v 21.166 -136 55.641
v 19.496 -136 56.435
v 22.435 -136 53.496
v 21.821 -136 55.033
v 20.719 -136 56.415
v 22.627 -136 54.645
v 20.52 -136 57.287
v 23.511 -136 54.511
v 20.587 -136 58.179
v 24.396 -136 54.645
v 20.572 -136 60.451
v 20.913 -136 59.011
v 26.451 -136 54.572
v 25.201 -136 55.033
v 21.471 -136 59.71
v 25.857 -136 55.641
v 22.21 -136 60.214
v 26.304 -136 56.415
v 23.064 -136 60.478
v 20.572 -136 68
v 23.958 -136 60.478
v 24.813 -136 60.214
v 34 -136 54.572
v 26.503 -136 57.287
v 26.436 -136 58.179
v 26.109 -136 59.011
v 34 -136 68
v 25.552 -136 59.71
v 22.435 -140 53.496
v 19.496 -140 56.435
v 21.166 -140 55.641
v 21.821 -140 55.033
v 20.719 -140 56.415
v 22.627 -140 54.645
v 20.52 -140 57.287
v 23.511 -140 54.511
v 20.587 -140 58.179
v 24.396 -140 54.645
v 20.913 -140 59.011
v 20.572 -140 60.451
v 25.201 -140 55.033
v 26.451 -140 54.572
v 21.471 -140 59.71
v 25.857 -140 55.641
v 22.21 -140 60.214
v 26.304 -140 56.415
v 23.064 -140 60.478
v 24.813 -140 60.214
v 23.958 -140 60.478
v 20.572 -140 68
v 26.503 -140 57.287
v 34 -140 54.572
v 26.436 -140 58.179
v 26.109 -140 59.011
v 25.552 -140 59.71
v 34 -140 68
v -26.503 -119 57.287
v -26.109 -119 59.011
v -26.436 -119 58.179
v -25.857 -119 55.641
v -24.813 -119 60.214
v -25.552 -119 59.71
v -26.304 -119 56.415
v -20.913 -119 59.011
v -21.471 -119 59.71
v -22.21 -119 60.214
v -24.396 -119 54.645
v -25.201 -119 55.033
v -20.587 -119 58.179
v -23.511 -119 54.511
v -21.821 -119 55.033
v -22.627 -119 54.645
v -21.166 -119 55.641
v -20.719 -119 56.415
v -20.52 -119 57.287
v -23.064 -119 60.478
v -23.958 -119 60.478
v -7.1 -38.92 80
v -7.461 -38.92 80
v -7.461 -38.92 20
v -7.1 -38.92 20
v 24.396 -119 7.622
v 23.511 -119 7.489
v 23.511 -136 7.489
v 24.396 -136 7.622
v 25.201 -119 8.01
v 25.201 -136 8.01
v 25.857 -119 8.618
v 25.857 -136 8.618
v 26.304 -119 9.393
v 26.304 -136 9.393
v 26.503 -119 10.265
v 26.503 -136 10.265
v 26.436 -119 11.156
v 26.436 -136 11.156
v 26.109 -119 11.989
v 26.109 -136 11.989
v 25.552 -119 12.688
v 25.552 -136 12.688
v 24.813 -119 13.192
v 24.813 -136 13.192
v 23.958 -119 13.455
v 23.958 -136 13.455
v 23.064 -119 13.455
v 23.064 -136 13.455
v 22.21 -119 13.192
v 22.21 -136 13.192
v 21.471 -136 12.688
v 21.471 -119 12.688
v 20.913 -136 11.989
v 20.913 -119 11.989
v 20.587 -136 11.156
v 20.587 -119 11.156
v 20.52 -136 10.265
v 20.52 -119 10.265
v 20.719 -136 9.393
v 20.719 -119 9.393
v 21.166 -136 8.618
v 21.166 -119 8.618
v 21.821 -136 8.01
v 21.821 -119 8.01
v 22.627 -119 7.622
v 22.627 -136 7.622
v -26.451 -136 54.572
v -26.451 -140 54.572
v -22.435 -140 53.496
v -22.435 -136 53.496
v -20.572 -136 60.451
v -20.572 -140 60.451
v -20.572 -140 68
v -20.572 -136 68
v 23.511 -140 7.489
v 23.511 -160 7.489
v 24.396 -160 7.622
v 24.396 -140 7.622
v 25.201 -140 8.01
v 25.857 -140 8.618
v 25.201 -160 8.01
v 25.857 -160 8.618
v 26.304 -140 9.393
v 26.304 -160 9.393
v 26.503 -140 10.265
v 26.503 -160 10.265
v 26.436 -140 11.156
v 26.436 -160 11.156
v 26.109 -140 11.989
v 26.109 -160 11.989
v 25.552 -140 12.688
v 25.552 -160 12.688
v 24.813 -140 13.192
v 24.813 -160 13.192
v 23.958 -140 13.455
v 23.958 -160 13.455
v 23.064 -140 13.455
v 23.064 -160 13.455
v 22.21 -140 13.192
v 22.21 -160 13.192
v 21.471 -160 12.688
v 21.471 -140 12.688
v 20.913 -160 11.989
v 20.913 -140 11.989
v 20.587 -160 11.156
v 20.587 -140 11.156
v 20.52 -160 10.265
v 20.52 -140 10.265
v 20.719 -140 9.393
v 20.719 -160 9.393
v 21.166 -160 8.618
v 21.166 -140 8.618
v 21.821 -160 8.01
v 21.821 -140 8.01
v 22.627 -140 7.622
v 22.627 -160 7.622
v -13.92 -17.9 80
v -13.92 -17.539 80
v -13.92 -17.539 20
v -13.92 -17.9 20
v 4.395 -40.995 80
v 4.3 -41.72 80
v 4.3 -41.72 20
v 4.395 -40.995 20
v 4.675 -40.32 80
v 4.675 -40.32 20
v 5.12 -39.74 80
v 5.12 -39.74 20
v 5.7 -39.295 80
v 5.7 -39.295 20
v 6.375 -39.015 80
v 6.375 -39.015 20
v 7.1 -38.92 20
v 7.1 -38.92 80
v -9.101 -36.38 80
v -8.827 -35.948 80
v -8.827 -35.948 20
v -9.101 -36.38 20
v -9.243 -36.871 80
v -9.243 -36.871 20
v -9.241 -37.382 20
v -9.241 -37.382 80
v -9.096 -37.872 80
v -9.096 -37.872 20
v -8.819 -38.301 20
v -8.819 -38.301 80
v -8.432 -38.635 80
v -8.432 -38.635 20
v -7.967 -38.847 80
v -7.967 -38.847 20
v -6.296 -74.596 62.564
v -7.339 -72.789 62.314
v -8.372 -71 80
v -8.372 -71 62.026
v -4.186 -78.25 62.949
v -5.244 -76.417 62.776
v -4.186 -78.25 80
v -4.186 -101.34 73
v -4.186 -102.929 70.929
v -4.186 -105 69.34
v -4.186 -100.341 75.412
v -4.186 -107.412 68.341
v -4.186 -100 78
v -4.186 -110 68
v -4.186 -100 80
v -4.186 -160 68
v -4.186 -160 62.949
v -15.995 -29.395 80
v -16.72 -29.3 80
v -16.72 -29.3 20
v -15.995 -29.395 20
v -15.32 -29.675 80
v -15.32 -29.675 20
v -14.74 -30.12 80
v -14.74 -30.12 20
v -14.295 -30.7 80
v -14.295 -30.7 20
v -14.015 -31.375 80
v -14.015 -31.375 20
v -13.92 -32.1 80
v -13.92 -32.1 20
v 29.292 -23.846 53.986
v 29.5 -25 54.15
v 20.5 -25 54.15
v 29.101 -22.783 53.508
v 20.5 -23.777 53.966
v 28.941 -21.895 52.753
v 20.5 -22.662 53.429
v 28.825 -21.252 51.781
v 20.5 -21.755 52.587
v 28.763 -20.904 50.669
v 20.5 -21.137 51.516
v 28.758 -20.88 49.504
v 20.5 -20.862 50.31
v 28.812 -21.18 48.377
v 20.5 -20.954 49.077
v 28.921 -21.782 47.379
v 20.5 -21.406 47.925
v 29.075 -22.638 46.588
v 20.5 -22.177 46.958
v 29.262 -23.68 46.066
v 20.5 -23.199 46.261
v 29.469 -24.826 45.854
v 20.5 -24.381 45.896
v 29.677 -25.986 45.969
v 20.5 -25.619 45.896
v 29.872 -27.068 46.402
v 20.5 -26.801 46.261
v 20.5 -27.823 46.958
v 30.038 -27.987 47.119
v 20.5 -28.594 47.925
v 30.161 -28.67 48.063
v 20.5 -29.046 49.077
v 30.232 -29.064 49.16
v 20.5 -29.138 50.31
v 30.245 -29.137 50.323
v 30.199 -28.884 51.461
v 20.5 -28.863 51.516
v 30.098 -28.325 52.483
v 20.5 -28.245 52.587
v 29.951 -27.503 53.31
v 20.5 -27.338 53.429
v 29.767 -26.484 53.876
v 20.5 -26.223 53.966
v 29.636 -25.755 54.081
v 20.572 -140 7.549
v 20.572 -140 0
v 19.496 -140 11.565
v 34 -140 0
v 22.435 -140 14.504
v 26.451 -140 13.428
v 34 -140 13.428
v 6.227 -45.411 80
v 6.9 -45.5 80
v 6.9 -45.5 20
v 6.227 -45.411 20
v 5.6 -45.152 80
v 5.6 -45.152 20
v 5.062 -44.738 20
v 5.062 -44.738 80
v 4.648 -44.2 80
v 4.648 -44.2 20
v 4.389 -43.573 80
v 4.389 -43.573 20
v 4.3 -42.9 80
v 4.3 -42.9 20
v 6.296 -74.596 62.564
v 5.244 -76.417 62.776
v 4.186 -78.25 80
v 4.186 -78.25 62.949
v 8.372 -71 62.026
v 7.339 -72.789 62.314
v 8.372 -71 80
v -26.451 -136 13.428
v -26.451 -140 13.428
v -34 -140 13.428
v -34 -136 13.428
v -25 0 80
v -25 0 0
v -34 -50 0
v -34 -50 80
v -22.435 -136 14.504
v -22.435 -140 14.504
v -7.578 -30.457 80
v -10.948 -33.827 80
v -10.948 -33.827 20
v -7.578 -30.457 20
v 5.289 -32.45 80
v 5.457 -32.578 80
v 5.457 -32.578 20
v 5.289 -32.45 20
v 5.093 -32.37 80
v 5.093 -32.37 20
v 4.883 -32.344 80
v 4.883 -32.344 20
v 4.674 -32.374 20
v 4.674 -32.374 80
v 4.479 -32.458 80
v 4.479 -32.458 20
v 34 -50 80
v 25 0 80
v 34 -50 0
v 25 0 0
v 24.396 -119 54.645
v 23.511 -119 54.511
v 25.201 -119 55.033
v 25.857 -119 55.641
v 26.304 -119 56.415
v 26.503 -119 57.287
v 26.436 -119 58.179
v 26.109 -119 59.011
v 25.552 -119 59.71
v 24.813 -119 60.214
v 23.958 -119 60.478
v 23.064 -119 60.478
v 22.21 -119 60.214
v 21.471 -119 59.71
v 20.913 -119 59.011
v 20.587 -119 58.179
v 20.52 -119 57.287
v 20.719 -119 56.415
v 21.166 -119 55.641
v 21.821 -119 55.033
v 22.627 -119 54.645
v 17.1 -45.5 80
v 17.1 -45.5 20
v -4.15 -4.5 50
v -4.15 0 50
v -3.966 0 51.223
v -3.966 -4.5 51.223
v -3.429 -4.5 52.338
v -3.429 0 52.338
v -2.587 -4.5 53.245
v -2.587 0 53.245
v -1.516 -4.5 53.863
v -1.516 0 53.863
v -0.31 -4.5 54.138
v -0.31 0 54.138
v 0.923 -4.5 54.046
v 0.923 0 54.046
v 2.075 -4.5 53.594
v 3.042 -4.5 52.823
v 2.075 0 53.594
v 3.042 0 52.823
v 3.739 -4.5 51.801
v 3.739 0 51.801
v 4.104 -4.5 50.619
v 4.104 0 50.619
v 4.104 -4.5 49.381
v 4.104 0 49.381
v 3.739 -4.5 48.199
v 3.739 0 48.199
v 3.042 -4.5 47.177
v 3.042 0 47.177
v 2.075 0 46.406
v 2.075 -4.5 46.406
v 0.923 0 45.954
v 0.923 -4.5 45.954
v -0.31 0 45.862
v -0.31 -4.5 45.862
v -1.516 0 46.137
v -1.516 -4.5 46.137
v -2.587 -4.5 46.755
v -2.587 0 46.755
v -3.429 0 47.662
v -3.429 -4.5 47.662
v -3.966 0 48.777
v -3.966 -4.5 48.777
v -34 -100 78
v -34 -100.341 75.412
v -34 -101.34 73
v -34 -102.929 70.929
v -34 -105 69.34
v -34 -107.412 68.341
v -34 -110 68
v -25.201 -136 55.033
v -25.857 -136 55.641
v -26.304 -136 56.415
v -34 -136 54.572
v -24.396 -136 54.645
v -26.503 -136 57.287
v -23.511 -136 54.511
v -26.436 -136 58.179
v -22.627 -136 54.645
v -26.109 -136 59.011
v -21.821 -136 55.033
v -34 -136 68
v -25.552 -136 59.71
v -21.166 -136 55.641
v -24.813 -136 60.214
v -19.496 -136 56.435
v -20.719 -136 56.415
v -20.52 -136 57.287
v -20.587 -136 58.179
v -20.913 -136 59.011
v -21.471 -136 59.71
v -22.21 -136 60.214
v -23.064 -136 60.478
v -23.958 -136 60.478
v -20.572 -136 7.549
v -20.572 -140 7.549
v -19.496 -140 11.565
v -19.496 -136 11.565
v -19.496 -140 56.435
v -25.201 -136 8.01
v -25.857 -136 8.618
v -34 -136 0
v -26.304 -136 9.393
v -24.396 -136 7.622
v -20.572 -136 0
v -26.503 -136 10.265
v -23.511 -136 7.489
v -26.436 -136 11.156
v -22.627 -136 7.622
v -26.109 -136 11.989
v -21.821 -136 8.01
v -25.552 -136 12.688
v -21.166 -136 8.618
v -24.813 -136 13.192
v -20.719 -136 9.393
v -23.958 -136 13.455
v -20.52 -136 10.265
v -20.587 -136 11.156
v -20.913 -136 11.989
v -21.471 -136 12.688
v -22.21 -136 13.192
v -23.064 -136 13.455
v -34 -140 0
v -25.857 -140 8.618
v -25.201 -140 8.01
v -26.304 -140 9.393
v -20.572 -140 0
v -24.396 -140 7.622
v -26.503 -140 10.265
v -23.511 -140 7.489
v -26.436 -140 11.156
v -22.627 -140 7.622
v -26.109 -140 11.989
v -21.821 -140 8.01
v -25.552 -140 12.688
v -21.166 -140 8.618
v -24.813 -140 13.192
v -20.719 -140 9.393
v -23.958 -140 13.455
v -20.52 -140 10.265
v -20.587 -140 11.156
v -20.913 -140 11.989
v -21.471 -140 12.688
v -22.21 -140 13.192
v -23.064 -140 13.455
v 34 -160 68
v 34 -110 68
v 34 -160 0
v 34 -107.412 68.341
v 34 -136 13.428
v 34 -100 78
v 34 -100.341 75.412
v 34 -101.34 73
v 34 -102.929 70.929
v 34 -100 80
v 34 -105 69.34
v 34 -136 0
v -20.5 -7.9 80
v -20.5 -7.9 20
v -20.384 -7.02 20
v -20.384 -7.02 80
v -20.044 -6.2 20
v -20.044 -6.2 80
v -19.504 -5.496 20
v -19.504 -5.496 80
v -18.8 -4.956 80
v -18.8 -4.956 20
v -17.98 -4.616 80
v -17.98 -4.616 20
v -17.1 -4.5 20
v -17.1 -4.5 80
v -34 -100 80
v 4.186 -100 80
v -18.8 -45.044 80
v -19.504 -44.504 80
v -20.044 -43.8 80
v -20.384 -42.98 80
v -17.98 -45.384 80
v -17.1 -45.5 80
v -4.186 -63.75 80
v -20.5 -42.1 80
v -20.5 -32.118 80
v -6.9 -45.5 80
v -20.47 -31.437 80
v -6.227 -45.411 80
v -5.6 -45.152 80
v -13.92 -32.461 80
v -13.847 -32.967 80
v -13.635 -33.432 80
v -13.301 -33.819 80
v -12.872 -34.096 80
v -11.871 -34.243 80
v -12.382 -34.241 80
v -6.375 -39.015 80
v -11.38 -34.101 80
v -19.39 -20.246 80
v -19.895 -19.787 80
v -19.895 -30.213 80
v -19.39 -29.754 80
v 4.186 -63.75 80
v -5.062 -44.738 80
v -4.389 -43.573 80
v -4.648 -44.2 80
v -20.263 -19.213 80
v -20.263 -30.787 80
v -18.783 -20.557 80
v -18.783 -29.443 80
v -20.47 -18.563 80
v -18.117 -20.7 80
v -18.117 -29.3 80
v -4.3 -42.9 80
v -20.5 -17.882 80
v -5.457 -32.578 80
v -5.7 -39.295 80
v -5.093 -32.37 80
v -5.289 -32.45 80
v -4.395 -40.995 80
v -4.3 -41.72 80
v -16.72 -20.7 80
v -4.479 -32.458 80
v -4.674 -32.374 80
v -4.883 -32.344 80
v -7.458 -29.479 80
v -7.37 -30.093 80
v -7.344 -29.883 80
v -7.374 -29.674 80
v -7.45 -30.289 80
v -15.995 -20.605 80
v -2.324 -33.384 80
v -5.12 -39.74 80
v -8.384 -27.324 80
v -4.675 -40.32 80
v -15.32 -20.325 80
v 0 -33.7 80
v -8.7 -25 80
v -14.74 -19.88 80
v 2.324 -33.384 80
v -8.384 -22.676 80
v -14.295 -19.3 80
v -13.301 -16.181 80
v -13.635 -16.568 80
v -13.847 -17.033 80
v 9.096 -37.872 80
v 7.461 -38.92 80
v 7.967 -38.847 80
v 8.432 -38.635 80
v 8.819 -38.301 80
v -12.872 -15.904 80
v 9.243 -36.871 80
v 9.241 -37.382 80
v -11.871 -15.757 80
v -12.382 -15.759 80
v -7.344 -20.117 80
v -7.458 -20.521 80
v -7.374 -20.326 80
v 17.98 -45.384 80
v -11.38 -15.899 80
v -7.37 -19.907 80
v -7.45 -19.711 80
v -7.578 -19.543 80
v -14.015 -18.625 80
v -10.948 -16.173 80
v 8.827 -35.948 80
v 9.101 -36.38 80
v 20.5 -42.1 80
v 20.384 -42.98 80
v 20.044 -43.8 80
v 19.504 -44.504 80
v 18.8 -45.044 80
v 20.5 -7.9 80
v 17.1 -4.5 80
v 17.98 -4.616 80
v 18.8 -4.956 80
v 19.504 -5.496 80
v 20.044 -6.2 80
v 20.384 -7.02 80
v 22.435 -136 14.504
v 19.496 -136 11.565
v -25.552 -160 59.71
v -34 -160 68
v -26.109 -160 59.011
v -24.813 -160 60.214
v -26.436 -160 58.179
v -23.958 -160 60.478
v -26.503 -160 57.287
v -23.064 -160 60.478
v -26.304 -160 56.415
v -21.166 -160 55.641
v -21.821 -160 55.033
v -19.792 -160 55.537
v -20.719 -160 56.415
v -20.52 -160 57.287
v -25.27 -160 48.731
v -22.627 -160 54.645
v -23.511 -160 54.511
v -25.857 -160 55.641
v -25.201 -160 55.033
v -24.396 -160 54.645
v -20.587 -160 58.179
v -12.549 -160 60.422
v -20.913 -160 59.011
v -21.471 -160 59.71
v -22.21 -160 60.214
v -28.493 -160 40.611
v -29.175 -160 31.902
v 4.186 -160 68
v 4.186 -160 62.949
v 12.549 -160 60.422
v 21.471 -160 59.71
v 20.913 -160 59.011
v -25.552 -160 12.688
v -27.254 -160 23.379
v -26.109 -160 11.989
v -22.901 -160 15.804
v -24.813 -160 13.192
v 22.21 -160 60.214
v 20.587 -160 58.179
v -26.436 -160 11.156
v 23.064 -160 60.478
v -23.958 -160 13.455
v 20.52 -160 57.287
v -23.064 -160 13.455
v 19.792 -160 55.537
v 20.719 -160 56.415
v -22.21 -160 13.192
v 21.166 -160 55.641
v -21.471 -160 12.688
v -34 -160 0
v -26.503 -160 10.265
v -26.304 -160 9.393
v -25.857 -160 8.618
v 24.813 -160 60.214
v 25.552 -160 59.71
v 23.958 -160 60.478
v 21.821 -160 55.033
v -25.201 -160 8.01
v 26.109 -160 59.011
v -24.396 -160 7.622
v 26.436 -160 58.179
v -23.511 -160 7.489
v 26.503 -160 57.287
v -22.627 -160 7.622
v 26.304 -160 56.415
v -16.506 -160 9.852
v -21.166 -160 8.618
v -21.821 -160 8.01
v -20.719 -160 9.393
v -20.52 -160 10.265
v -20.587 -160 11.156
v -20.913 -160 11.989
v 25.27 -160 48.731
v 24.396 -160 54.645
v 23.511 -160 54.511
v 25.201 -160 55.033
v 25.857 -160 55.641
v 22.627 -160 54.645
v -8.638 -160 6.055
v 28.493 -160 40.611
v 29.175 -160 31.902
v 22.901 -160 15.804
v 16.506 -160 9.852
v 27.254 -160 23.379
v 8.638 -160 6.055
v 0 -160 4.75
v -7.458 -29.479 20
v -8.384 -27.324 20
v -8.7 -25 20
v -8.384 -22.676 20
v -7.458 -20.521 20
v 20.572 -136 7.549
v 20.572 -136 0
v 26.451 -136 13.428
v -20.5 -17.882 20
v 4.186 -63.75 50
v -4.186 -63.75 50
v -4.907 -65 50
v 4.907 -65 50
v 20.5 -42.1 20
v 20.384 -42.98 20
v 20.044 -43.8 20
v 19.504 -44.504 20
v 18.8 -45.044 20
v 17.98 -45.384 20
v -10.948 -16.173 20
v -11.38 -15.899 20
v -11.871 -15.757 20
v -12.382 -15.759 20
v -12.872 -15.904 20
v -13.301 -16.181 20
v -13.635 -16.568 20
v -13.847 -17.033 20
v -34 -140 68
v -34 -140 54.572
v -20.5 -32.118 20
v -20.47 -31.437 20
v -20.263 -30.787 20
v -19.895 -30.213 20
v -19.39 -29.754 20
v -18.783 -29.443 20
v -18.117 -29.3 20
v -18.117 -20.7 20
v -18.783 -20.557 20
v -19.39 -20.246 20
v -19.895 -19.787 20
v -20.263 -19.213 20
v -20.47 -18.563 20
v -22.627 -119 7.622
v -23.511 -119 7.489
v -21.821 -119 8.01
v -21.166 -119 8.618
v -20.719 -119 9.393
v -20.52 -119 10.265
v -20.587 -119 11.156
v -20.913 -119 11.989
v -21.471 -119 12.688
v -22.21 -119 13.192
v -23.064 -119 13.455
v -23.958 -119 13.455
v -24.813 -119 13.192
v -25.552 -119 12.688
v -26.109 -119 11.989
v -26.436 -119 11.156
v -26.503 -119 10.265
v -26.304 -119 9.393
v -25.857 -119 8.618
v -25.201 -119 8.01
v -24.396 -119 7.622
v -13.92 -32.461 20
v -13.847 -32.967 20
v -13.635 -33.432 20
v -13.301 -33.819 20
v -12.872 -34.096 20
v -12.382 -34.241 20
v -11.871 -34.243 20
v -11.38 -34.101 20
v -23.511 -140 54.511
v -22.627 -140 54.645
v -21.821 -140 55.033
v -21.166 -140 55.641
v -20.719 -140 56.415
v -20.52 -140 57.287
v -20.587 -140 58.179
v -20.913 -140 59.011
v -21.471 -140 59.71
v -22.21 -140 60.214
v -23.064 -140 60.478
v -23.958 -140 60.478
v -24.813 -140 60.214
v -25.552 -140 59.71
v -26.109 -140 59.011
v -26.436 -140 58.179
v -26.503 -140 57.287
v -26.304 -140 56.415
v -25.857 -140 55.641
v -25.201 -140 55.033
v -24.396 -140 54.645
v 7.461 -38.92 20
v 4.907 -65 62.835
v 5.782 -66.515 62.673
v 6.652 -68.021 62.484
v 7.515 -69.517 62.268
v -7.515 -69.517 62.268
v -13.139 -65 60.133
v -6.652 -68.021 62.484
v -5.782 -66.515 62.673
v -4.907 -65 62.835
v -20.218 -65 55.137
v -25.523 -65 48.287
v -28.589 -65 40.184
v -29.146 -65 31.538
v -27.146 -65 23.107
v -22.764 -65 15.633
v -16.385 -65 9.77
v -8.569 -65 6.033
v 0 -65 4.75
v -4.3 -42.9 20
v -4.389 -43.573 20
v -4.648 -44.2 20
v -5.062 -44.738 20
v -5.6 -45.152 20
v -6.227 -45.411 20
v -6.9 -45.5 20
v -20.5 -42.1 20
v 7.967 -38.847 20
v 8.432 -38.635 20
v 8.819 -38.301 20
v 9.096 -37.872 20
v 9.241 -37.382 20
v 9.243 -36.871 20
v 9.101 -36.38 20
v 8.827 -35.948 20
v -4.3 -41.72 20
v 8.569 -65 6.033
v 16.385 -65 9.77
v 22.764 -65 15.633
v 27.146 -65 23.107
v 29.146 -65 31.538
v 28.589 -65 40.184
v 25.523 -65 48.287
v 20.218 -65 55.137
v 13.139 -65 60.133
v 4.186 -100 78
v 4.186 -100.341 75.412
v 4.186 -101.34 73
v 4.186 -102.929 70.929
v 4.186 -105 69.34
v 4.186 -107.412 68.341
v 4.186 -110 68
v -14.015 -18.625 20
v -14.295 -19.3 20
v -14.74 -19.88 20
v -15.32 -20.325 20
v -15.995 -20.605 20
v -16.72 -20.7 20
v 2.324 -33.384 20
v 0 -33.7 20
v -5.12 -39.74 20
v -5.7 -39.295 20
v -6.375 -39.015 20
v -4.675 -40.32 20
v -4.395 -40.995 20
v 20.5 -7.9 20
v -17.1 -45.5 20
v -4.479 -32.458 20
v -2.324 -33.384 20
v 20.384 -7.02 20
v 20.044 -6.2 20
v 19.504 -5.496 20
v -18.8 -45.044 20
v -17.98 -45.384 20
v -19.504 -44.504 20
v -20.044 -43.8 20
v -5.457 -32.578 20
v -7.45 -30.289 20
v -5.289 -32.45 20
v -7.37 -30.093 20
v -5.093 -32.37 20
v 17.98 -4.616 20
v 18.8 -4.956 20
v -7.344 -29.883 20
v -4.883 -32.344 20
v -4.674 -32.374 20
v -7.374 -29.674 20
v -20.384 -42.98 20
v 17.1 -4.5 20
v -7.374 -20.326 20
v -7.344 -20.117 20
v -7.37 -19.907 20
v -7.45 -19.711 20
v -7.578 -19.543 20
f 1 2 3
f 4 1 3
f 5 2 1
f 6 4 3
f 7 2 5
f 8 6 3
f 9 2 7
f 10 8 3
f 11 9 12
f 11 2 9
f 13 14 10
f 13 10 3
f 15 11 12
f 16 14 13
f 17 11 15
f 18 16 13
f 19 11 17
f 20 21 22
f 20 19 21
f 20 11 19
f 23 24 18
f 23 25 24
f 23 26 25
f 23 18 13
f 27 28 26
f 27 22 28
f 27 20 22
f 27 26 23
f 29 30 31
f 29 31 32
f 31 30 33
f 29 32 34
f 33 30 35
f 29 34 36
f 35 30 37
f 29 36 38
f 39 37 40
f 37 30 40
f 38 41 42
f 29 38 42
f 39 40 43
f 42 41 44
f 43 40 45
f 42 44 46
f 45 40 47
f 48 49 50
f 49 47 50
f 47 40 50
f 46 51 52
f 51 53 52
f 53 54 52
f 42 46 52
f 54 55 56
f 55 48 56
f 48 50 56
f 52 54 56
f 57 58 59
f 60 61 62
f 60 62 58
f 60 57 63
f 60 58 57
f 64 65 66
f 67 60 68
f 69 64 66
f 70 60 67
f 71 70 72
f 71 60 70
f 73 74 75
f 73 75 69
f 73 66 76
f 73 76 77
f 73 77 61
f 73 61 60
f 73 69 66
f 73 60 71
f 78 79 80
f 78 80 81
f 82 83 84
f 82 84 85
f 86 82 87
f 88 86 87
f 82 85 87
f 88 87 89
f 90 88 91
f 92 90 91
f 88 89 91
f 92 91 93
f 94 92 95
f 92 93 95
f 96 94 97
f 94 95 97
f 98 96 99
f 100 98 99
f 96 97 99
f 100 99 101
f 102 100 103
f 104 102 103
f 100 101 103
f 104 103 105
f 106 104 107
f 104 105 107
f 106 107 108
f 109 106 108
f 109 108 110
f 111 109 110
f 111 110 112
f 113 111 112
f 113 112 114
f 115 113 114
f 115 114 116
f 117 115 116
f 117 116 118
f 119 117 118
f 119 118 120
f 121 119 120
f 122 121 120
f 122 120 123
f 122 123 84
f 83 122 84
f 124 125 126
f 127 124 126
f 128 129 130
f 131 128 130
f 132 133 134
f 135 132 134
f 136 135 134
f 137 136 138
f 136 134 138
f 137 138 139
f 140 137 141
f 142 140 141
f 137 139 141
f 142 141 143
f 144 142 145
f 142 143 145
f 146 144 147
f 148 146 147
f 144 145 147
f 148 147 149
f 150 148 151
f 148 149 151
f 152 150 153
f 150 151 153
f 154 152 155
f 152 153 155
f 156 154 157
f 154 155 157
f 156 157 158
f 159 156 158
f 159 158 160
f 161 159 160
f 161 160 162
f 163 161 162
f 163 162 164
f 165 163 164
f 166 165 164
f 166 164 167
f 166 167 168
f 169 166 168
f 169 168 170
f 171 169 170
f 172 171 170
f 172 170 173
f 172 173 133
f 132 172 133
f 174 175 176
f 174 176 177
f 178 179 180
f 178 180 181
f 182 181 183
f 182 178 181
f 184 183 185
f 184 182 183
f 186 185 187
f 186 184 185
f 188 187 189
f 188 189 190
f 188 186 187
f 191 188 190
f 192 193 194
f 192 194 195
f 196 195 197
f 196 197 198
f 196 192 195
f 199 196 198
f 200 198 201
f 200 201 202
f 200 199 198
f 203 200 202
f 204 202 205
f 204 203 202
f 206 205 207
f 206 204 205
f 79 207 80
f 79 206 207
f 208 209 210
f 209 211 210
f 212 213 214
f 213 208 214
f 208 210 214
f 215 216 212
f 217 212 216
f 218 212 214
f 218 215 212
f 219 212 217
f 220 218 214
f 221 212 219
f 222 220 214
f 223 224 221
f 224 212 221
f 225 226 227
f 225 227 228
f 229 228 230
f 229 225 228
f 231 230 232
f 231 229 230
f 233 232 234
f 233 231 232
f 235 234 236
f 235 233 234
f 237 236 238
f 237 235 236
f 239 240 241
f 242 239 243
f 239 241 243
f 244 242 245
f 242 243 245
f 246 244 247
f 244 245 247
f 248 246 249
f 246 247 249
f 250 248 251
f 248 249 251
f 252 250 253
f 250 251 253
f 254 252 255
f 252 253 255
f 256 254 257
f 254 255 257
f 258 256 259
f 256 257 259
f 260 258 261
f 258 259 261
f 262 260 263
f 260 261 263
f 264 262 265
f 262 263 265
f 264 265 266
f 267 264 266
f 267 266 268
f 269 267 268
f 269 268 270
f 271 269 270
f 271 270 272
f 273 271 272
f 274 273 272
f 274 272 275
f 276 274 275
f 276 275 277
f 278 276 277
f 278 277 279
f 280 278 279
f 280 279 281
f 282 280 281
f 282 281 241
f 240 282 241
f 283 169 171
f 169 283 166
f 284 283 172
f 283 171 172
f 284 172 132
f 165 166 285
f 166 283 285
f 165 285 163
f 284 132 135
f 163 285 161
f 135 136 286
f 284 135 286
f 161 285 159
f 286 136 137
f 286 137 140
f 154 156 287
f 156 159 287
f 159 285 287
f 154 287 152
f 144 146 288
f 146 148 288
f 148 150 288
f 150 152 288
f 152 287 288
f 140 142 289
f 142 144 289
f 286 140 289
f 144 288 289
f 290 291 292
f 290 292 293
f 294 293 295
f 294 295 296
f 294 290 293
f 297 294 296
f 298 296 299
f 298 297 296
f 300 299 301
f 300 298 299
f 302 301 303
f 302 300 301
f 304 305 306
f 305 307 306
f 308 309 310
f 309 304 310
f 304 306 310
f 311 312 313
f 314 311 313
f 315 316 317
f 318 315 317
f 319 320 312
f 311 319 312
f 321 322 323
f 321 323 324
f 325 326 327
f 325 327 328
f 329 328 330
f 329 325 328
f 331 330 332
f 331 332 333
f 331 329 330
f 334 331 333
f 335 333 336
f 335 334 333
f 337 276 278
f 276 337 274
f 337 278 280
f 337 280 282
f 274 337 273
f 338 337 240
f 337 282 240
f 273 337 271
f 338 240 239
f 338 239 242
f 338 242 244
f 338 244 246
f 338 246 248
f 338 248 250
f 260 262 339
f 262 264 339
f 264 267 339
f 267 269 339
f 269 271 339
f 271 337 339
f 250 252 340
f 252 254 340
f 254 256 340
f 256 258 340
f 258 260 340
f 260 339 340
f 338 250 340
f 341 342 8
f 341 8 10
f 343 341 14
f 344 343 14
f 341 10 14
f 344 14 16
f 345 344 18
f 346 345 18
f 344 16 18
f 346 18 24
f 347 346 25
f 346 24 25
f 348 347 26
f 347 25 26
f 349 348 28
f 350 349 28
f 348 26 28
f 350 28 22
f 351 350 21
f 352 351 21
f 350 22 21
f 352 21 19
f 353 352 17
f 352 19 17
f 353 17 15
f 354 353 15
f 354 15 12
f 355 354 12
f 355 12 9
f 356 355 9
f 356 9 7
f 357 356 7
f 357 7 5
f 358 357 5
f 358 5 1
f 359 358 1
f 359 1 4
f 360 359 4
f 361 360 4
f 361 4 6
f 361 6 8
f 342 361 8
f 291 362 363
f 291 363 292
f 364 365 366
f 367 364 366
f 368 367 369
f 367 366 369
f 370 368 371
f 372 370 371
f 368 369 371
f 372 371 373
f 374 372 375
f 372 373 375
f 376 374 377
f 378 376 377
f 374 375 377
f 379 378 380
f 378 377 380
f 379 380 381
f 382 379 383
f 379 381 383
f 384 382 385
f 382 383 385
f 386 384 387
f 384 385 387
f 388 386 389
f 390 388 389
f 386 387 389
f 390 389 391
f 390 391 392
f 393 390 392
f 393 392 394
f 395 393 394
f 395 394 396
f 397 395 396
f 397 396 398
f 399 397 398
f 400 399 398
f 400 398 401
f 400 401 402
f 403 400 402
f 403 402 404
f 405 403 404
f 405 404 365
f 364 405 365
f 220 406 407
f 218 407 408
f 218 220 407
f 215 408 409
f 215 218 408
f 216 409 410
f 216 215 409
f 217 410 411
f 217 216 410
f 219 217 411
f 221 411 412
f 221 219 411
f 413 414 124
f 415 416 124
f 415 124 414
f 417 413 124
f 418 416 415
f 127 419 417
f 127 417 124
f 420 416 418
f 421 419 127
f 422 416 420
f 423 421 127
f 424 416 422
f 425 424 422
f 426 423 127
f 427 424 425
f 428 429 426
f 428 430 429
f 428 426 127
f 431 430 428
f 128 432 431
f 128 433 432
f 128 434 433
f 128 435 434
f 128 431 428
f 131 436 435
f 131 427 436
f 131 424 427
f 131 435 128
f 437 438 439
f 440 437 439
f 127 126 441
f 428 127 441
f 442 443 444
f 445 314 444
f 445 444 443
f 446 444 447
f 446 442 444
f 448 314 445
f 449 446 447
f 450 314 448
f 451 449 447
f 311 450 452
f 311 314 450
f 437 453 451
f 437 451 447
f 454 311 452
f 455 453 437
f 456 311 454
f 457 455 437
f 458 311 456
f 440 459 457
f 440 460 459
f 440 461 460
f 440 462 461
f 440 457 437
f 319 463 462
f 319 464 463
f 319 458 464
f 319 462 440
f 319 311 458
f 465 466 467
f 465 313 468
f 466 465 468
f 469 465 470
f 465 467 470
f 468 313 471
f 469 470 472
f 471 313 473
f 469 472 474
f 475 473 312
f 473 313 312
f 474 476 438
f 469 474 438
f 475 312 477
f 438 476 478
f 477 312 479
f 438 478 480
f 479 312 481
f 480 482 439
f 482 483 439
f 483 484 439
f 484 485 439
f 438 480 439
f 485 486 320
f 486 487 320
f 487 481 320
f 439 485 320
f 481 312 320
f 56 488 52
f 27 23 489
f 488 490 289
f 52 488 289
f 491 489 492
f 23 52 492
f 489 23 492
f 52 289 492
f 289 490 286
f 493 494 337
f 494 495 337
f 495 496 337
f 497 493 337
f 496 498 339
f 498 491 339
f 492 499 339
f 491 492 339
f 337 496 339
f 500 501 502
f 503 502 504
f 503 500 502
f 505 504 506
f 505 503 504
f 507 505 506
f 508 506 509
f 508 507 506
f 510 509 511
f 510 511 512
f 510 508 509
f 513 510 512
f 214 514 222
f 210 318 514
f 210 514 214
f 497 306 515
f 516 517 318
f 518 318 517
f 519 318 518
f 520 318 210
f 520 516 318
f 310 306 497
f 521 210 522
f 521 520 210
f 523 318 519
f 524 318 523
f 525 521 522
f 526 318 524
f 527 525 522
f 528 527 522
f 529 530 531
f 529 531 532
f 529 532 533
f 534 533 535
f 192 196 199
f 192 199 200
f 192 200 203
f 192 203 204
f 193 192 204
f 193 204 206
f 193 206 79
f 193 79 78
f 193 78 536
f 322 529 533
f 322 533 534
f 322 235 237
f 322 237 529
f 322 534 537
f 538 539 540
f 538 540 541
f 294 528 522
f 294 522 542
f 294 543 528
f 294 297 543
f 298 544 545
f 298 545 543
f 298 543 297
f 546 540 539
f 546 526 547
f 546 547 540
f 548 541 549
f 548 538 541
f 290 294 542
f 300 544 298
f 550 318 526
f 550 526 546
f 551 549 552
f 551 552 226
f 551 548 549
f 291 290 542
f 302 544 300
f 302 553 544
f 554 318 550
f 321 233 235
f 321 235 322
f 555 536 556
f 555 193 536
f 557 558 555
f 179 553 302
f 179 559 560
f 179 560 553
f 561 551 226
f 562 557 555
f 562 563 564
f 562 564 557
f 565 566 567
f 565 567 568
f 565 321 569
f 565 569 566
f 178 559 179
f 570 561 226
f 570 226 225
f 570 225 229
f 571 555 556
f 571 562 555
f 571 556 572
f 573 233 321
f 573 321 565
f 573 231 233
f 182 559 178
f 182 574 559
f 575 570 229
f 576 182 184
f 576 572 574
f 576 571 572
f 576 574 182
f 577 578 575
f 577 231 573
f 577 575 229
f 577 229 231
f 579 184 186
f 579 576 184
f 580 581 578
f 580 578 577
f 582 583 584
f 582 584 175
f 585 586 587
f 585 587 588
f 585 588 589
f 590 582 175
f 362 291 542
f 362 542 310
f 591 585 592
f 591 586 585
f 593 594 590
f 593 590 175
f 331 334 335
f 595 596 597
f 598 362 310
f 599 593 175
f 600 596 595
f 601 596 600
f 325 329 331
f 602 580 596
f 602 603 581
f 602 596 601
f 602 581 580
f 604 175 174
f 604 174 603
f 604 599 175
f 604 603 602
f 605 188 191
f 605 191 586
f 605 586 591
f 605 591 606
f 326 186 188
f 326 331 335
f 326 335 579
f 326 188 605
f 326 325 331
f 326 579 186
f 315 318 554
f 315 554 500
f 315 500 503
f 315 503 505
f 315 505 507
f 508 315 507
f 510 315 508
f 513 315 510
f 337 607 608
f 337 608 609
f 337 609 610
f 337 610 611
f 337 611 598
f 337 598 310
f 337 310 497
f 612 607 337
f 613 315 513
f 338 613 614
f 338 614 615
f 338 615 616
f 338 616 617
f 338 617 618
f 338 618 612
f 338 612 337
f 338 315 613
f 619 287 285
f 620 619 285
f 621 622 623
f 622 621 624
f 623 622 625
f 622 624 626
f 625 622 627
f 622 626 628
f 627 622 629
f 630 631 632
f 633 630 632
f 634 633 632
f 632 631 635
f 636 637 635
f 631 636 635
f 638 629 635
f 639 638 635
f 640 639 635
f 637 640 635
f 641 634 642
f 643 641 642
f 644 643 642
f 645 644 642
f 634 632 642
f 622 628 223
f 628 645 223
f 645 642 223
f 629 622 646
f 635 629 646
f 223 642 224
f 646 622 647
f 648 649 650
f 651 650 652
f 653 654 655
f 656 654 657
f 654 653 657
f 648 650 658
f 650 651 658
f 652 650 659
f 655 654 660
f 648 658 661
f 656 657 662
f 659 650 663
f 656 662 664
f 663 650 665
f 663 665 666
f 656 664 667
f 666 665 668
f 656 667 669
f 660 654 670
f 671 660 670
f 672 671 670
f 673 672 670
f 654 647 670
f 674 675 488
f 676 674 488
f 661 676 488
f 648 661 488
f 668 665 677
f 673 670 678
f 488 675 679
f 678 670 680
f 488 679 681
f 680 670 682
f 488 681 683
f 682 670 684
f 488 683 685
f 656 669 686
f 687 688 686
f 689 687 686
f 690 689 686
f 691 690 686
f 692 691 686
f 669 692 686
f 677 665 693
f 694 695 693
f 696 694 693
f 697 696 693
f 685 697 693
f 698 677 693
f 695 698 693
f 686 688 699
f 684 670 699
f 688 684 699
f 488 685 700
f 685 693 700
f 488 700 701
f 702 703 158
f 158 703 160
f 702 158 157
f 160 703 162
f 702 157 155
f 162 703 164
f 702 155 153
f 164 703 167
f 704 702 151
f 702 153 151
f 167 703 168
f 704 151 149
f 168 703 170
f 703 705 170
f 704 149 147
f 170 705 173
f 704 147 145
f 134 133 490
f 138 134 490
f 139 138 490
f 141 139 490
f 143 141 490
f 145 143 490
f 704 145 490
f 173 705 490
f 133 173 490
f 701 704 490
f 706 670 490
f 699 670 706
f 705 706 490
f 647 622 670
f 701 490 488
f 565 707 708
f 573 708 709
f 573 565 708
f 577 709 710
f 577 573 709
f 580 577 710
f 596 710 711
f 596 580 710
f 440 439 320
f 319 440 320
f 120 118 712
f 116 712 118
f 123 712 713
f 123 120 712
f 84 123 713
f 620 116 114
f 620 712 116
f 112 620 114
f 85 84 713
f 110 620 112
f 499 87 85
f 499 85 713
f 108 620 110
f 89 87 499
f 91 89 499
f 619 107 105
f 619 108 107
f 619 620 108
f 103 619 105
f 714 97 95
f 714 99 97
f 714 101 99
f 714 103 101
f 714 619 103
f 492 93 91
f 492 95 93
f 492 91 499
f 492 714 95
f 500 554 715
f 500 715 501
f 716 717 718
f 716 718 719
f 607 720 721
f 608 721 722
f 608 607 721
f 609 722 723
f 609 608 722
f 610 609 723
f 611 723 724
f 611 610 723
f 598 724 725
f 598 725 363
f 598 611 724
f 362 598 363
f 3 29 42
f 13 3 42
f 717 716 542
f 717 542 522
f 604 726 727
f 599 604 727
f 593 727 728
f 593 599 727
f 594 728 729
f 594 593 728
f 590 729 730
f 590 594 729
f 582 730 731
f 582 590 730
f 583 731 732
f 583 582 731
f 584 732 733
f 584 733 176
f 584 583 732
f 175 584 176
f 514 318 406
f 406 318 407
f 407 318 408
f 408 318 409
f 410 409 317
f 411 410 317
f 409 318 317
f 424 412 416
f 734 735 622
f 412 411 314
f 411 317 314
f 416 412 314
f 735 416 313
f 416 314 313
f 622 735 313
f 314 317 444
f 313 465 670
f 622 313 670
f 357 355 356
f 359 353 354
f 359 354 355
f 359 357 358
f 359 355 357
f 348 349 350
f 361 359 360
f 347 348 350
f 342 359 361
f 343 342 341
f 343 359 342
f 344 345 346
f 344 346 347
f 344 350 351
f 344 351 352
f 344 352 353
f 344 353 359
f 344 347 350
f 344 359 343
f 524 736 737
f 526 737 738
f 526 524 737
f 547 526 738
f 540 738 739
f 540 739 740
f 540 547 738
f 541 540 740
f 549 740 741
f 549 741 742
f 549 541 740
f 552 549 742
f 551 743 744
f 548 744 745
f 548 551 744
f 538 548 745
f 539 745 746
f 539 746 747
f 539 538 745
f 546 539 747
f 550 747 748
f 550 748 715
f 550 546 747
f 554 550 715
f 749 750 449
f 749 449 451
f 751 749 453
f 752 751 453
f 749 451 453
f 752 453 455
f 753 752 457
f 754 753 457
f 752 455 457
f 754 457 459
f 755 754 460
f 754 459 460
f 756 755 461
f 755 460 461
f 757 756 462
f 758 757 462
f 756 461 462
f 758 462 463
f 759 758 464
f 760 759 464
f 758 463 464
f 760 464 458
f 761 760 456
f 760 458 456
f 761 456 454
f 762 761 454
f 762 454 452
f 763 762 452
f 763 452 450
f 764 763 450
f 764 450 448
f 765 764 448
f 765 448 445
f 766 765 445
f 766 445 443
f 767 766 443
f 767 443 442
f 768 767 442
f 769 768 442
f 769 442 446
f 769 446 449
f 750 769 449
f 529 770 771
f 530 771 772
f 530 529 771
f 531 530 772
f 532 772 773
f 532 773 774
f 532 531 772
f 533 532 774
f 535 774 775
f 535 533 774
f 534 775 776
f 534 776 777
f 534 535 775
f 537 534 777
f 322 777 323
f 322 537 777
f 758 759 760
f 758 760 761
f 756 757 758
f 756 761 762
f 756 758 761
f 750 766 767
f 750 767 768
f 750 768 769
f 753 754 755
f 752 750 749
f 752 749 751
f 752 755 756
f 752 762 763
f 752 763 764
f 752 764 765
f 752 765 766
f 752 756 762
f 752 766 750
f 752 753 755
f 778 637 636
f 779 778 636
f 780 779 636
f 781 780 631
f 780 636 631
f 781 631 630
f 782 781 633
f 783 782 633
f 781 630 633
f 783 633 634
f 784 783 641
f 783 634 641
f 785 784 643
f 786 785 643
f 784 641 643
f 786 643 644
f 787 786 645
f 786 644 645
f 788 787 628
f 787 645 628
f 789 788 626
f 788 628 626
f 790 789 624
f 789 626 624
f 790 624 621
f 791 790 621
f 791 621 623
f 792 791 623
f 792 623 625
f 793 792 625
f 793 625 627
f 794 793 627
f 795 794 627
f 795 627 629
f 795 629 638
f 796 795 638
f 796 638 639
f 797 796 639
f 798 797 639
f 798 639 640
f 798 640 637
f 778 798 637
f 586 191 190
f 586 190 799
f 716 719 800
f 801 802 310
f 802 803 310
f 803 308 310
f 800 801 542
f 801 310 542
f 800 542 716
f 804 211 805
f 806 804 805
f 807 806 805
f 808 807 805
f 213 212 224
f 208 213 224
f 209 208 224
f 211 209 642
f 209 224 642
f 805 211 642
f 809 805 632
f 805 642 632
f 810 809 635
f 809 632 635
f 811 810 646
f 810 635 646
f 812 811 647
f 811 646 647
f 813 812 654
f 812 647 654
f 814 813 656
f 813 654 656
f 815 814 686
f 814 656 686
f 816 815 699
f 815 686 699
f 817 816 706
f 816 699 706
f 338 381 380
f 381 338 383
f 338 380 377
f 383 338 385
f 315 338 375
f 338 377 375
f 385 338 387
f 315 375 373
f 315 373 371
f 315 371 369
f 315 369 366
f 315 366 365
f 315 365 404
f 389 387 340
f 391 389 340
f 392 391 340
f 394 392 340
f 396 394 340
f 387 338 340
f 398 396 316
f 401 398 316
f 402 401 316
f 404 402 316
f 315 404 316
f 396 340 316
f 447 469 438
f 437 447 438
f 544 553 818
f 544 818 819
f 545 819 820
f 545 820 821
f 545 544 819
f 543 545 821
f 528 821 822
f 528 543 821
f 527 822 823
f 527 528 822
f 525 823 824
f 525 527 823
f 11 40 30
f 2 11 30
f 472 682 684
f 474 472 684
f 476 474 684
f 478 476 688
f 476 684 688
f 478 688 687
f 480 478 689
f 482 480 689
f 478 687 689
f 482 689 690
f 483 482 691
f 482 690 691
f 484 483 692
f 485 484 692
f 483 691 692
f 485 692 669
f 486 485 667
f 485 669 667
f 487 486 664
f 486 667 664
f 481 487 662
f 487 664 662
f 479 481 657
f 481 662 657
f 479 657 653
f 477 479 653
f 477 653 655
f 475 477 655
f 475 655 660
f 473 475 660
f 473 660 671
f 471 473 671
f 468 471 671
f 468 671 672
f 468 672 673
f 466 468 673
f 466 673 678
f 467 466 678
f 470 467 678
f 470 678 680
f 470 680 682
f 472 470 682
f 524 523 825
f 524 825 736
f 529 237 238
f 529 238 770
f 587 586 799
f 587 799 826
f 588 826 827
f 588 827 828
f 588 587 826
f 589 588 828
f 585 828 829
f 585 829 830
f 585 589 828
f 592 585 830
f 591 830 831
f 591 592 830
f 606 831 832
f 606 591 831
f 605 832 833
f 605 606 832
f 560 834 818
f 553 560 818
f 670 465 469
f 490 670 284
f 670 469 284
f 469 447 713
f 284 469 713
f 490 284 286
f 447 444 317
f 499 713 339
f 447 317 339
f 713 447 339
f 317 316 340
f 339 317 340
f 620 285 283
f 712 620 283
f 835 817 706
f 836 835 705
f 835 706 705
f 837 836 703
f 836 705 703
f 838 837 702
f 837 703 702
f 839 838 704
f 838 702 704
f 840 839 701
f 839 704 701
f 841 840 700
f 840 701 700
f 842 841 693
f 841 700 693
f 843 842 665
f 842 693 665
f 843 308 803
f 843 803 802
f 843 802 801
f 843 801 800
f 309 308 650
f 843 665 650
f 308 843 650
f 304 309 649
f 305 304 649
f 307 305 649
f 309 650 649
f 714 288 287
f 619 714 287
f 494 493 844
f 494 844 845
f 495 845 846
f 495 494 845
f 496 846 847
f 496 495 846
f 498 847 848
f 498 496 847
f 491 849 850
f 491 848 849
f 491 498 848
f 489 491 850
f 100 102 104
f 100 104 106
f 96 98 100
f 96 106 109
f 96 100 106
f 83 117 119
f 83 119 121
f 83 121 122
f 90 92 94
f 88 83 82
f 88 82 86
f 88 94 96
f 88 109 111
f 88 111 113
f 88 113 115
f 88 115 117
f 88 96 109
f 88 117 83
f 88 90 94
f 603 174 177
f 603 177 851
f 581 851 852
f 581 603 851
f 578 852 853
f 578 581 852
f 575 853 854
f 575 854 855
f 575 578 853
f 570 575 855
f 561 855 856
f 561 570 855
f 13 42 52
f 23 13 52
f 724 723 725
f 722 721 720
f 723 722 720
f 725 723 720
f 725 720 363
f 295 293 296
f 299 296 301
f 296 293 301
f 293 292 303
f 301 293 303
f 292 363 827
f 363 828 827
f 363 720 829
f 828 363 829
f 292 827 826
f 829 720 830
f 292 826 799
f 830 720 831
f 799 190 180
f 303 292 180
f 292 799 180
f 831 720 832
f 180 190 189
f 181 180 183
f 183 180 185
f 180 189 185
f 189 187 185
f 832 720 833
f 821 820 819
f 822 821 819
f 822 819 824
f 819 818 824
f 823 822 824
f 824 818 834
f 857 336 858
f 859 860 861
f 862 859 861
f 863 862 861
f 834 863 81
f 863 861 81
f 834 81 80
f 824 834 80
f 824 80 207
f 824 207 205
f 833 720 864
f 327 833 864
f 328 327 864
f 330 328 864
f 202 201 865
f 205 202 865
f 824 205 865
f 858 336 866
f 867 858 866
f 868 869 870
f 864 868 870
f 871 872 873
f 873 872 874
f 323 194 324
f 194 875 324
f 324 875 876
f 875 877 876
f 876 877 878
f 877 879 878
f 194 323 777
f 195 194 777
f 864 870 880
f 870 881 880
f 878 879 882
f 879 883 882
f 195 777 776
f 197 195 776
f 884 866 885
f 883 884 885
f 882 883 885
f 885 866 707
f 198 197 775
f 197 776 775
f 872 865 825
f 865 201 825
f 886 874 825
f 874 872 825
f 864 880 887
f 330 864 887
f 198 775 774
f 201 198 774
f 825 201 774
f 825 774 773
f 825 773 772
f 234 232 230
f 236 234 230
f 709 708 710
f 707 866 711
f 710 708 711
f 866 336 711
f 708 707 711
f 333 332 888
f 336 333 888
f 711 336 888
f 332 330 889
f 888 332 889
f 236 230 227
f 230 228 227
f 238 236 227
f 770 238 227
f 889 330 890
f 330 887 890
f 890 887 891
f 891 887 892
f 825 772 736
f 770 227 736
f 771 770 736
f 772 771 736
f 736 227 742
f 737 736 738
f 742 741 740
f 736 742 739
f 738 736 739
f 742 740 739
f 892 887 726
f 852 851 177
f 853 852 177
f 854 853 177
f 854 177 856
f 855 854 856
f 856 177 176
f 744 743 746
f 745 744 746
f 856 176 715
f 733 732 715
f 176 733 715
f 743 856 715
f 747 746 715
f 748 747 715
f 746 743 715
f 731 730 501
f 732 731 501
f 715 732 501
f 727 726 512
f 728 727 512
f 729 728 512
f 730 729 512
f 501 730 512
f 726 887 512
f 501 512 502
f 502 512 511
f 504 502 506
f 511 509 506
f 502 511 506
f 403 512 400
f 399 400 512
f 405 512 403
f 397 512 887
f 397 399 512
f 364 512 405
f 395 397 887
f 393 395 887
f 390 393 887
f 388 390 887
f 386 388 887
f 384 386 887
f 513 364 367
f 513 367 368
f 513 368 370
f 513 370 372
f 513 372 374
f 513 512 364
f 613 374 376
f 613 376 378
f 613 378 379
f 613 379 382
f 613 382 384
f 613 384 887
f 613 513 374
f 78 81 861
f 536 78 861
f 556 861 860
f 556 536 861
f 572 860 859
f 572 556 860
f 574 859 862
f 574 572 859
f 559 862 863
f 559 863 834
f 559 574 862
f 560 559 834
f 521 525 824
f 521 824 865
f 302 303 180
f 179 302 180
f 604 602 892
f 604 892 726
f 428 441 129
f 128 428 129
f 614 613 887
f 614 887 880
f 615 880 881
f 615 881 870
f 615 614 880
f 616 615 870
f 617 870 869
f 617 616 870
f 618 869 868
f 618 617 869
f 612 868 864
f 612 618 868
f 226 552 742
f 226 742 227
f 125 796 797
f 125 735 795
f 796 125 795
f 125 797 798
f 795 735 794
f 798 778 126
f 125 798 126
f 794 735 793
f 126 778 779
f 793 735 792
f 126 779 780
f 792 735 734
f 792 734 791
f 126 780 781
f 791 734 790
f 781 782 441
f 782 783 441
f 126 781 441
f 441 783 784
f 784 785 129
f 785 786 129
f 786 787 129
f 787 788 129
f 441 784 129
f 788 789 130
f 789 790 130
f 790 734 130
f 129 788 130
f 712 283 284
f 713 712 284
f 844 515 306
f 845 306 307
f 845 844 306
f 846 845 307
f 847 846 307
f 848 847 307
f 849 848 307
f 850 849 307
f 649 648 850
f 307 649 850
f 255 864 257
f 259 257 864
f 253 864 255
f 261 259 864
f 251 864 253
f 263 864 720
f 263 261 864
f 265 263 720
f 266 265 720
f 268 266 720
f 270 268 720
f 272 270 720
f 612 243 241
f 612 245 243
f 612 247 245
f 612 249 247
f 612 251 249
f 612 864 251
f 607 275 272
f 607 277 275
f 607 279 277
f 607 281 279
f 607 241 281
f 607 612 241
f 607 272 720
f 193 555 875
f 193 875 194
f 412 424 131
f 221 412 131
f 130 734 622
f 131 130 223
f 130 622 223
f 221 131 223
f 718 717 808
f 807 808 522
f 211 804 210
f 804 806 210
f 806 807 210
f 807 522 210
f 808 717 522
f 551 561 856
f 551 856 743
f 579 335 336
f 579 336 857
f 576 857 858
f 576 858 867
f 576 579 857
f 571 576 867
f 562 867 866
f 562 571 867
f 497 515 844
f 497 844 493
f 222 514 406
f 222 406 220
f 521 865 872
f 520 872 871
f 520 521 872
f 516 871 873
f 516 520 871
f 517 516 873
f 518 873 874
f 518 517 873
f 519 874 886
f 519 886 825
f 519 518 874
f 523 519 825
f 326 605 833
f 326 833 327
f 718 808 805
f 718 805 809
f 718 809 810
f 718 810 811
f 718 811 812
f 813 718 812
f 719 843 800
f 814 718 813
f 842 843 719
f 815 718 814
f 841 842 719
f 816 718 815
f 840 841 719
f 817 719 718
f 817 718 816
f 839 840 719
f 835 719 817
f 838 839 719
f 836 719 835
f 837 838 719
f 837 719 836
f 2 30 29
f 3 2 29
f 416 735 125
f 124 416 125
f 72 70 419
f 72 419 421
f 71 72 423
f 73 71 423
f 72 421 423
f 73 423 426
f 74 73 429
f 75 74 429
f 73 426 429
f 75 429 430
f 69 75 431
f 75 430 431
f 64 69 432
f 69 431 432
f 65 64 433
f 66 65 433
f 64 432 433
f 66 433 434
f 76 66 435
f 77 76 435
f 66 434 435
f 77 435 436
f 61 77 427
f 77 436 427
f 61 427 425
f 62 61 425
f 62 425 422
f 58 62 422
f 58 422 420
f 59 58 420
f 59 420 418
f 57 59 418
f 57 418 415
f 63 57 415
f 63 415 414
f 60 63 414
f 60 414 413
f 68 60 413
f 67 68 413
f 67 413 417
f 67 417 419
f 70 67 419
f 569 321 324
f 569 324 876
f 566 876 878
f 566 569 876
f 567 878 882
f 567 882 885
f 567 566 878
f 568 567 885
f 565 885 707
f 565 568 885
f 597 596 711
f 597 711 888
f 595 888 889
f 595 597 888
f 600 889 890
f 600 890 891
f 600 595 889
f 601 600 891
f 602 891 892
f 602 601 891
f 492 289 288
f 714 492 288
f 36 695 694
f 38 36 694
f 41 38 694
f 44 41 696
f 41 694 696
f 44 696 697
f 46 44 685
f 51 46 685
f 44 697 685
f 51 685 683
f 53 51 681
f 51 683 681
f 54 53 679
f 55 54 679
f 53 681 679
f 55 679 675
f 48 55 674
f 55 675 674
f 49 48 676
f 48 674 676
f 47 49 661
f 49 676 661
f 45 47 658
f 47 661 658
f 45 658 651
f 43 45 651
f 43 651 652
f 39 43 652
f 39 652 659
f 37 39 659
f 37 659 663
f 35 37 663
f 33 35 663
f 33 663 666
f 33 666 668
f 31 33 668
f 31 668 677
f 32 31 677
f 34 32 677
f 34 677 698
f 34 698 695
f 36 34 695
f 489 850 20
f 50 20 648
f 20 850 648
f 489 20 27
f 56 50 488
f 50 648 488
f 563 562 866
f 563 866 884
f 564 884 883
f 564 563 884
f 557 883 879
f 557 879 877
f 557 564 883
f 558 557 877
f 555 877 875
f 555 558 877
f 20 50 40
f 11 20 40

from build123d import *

# Parameters (mm, degrees)
BOSS_EXTRUDE1_DEPTH = 80
SKETCH2_W           = 68
SKETCH2_H           = 12
CUT_EXTRUDE1_DEPTH  = 60
FILLET1_R           = 10
CUT_EXTRUDE6_DEPTH  = 60
SKETCH6_R           = 29.25
CUT_EXTRUDE7_DEPTH  = 95
SKETCH7_R           = 3
CUT_EXTRUDE8_DEPTH  = 41
CUT_EXTRUDE9_START  = -20
CUT_EXTRUDE9_DEPTH  = 4
CUT_EXTRUDE10_DEPTH = 30
CUT_EXTRUDE11_START = -90
CUT_EXTRUDE11_DEPTH = 90
SKETCH11_R          = 4.15
CUT_EXTRUDE12_DEPTH = 18
SKETCH12_R          = 4.15
CUT_EXTRUDE13_DEPTH = 18


with BuildPart() as part:
    # Sketch1 → Boss-Extrude1 (new body)
    with BuildSketch(Plane.XY):
        Polygon((25, 0), (-25, 0), (-34, -50), (-34, -160), (34, -160), (34, -50), align=None)
    extrude(amount=BOSS_EXTRUDE1_DEPTH)

    # Sketch2 → Cut-Extrude1 (cut)
    with BuildSketch(Plane.XZ.offset(160)):
        with Locations((0, 74)):
            Rectangle(SKETCH2_W, SKETCH2_H)
    extrude(amount=-CUT_EXTRUDE1_DEPTH, mode=Mode.SUBTRACT)

    # Fillet1
    fillet1_edges = [part.edges().sort_by_distance(p)[0] for p in [
        (0, -100, 68),
    ]]
    fillet(fillet1_edges, radius=FILLET1_R)

    # Sketch5 → Cut-Extrude6 (cut)
    with BuildSketch(Plane.XY.offset(80)):
        with BuildLine():
            Line((17.1, -45.5), (6.9, -45.5))
            ThreePointArc((6.9, -45.5), (5.061522369, -44.738477631), (4.3, -42.9))
            Line((4.3, -42.9), (4.3, -41.72))
            ThreePointArc((4.3, -41.72), (5.120101013, -39.740101013), (7.1, -38.92))
            Line((7.1, -38.92), (7.460539391, -38.92))
            ThreePointArc((7.460539391, -38.92), (9.09596662, -37.871916072), (8.826877189, -35.948197533))
            Line((8.826877189, -35.948197533), (5.457008123, -32.578328466))
            ThreePointArc((5.457008123, -32.578328466), (4.988893203, -32.349986186), (4.479421839, -32.458202195))
            ThreePointArc((4.479421839, -32.458202195), (0, -33.7), (-4.479421839, -32.458202195))
            ThreePointArc((-4.479421839, -32.458202195), (-4.988893203, -32.349986186), (-5.457008123, -32.578328466))
            Line((-5.457008123, -32.578328466), (-8.826877189, -35.948197533))
            ThreePointArc((-8.826877189, -35.948197533), (-9.09596662, -37.871916072), (-7.460539391, -38.92))
            Line((-7.460539391, -38.92), (-7.1, -38.92))
            ThreePointArc((-7.1, -38.92), (-5.120101013, -39.740101013), (-4.3, -41.72))
            Line((-4.3, -41.72), (-4.3, -42.9))
            ThreePointArc((-4.3, -42.9), (-5.061522369, -44.738477631), (-6.9, -45.5))
            Line((-6.9, -45.5), (-17.1, -45.5))
            ThreePointArc((-17.1, -45.5), (-19.504163056, -44.504163056), (-20.5, -42.1))
            Line((-20.5, -42.1), (-20.5, -32.118179099))
            ThreePointArc((-20.5, -32.118179099), (-19.895099696, -30.212814465), (-18.116592311, -29.3))
            Line((-18.116592311, -29.3), (-16.72, -29.3))
            ThreePointArc((-16.72, -29.3), (-14.740101013, -30.120101013), (-13.92, -32.1))
            Line((-13.92, -32.1), (-13.92, -32.460539391))
            ThreePointArc((-13.92, -32.460539391), (-12.871916072, -34.09596662), (-10.948197533, -33.826877189))
            Line((-10.948197533, -33.826877189), (-7.578328467, -30.457008123))
            ThreePointArc((-7.578328467, -30.457008123), (-7.349986186, -29.988893203), (-7.458202195, -29.479421839))
            ThreePointArc((-7.458202195, -29.479421839), (-8.7, -25), (-7.458202195, -20.520578161))
            ThreePointArc((-7.458202195, -20.520578161), (-7.349986186, -20.011106797), (-7.578328467, -19.542991877))
            Line((-7.578328467, -19.542991877), (-10.948197533, -16.173122811))
            ThreePointArc((-10.948197533, -16.173122811), (-12.871916072, -15.90403338), (-13.92, -17.539460609))
            Line((-13.92, -17.539460609), (-13.92, -17.9))
            ThreePointArc((-13.92, -17.9), (-14.740101013, -19.879898987), (-16.72, -20.7))
            Line((-16.72, -20.7), (-18.116592311, -20.7))
            ThreePointArc((-18.116592311, -20.7), (-19.895099696, -19.787185535), (-20.5, -17.881820901))
            Line((-20.5, -17.881820901), (-20.5, -7.9))
            ThreePointArc((-20.5, -7.9), (-19.504163056, -5.495836944), (-17.1, -4.5))
            Line((-17.1, -4.5), (-7.1, -4.5))
            Line((-7.1, -4.5), (7.1, -4.5))
            Line((7.1, -4.5), (17.1, -4.5))
            ThreePointArc((17.1, -4.5), (19.504163056, -5.495836944), (20.5, -7.9))
            Line((20.5, -7.9), (20.5, -18.1))
            Line((20.5, -18.1), (20.5, -31.9))
            Line((20.5, -31.9), (20.5, -42.1))
            ThreePointArc((20.5, -42.1), (19.504163056, -44.504163056), (17.1, -45.5))
        make_face()
    extrude(amount=-CUT_EXTRUDE6_DEPTH, mode=Mode.SUBTRACT)

    # Sketch6 → Cut-Extrude7 (cut)
    with BuildSketch(Plane.XZ.offset(160)):
        with Locations(Location((0, 34, 0), (0, 0, 270))):
            Circle(SKETCH6_R)
    extrude(amount=-CUT_EXTRUDE7_DEPTH, mode=Mode.SUBTRACT)

    # Sketch7 → Cut-Extrude8 (cut)
    with BuildSketch(Plane.XZ.offset(160)):
        with Locations(Location((-23.511300474, 57.511300474, 0), (0, 0, 270))):
            Circle(SKETCH7_R)
        with Locations(Location((23.511300474, 57.511300474, 0), (0, 0, 270))):
            Circle(SKETCH7_R)
        with Locations(Location((23.511300474, 10.488699526, 0), (0, 0, 270))):
            Circle(SKETCH7_R)
        with Locations(Location((-23.511300474, 10.488699526, 0), (0, 0, 270))):
            Circle(SKETCH7_R)
    extrude(amount=-CUT_EXTRUDE8_DEPTH, mode=Mode.SUBTRACT)

    # Sketch8 → Cut-Extrude9 (cut)
    with BuildSketch(Plane.XZ.offset(160).offset(CUT_EXTRUDE9_START)):
        Polygon((-26.450688166, 54.571912783), (-22.435409908, 53.496022217), (-19.496022217, 56.435409908), (-20.571912783, 60.450688166), (-20.571912783, 68), (-34, 68), (-34, 54.571912783), align=None)
        Polygon((20.571912783, 60.450688166), (19.496022217, 56.435409908), (22.435409908, 53.496022217), (26.450688166, 54.571912783), (34, 54.571912783), (34, 68), (20.571912783, 68), align=None)
        Polygon((26.450688166, 13.428087217), (22.435409908, 14.503977783), (19.496022217, 11.564590092), (20.571912783, 7.549311834), (20.571912783, 0), (34, 0), (34, 13.428087217), align=None)
        Polygon((-20.571912783, 7.549311834), (-19.496022217, 11.564590092), (-22.435409908, 14.503977783), (-26.450688166, 13.428087217), (-34, 13.428087217), (-34, 0), (-20.571912783, 0), align=None)
    extrude(amount=-CUT_EXTRUDE9_DEPTH, mode=Mode.SUBTRACT)

    # Sketch9 → Cut-Extrude10 (cut)
    with BuildSketch(Plane.XY.offset(80)):
        Polygon((4.185789452, -63.75), (-4.185789452, -63.75), (-8.371578903, -71), (-4.185789452, -78.25), (4.185789452, -78.25), (8.371578903, -71), align=None)
    extrude(amount=-CUT_EXTRUDE10_DEPTH, mode=Mode.SUBTRACT)

    # Sketch10 → Cut-Extrude11 (cut)
    with BuildSketch(Plane(origin=(0, -78.25, 0), x_dir=(1, 0, 0), z_dir=(0, 1, 0)).offset(CUT_EXTRUDE11_START)):
        with BuildLine():
            Line((-4.185789452, -62.948949319), (-4.185789452, -80))
            Line((-4.185789452, -80), (4.185789452, -80))
            Line((4.185789452, -80), (4.185789452, -62.948949319))
            ThreePointArc((4.185789452, -62.948949319), (0, -63.25), (-4.185789452, -62.948949319))
        make_face()
    extrude(amount=CUT_EXTRUDE11_DEPTH, mode=Mode.SUBTRACT)

    # Sketch11 → Cut-Extrude12 (cut)
    with BuildSketch(Plane(origin=(0, 0, 0), x_dir=(1, 0, 0), z_dir=(0, 1, 0))):
        with Locations(Location((0, -50, 0), (0, 0, 180))):
            Circle(SKETCH11_R)
    extrude(amount=-CUT_EXTRUDE12_DEPTH, mode=Mode.SUBTRACT)

    # Sketch12 → Cut-Extrude13 (cut)
    with BuildSketch(Plane.ZY.offset(-20.5)):
        with Locations((50, -25)):
            Circle(SKETCH12_R)
    extrude(amount=-CUT_EXTRUDE13_DEPTH, mode=Mode.SUBTRACT)


solid = part.part
